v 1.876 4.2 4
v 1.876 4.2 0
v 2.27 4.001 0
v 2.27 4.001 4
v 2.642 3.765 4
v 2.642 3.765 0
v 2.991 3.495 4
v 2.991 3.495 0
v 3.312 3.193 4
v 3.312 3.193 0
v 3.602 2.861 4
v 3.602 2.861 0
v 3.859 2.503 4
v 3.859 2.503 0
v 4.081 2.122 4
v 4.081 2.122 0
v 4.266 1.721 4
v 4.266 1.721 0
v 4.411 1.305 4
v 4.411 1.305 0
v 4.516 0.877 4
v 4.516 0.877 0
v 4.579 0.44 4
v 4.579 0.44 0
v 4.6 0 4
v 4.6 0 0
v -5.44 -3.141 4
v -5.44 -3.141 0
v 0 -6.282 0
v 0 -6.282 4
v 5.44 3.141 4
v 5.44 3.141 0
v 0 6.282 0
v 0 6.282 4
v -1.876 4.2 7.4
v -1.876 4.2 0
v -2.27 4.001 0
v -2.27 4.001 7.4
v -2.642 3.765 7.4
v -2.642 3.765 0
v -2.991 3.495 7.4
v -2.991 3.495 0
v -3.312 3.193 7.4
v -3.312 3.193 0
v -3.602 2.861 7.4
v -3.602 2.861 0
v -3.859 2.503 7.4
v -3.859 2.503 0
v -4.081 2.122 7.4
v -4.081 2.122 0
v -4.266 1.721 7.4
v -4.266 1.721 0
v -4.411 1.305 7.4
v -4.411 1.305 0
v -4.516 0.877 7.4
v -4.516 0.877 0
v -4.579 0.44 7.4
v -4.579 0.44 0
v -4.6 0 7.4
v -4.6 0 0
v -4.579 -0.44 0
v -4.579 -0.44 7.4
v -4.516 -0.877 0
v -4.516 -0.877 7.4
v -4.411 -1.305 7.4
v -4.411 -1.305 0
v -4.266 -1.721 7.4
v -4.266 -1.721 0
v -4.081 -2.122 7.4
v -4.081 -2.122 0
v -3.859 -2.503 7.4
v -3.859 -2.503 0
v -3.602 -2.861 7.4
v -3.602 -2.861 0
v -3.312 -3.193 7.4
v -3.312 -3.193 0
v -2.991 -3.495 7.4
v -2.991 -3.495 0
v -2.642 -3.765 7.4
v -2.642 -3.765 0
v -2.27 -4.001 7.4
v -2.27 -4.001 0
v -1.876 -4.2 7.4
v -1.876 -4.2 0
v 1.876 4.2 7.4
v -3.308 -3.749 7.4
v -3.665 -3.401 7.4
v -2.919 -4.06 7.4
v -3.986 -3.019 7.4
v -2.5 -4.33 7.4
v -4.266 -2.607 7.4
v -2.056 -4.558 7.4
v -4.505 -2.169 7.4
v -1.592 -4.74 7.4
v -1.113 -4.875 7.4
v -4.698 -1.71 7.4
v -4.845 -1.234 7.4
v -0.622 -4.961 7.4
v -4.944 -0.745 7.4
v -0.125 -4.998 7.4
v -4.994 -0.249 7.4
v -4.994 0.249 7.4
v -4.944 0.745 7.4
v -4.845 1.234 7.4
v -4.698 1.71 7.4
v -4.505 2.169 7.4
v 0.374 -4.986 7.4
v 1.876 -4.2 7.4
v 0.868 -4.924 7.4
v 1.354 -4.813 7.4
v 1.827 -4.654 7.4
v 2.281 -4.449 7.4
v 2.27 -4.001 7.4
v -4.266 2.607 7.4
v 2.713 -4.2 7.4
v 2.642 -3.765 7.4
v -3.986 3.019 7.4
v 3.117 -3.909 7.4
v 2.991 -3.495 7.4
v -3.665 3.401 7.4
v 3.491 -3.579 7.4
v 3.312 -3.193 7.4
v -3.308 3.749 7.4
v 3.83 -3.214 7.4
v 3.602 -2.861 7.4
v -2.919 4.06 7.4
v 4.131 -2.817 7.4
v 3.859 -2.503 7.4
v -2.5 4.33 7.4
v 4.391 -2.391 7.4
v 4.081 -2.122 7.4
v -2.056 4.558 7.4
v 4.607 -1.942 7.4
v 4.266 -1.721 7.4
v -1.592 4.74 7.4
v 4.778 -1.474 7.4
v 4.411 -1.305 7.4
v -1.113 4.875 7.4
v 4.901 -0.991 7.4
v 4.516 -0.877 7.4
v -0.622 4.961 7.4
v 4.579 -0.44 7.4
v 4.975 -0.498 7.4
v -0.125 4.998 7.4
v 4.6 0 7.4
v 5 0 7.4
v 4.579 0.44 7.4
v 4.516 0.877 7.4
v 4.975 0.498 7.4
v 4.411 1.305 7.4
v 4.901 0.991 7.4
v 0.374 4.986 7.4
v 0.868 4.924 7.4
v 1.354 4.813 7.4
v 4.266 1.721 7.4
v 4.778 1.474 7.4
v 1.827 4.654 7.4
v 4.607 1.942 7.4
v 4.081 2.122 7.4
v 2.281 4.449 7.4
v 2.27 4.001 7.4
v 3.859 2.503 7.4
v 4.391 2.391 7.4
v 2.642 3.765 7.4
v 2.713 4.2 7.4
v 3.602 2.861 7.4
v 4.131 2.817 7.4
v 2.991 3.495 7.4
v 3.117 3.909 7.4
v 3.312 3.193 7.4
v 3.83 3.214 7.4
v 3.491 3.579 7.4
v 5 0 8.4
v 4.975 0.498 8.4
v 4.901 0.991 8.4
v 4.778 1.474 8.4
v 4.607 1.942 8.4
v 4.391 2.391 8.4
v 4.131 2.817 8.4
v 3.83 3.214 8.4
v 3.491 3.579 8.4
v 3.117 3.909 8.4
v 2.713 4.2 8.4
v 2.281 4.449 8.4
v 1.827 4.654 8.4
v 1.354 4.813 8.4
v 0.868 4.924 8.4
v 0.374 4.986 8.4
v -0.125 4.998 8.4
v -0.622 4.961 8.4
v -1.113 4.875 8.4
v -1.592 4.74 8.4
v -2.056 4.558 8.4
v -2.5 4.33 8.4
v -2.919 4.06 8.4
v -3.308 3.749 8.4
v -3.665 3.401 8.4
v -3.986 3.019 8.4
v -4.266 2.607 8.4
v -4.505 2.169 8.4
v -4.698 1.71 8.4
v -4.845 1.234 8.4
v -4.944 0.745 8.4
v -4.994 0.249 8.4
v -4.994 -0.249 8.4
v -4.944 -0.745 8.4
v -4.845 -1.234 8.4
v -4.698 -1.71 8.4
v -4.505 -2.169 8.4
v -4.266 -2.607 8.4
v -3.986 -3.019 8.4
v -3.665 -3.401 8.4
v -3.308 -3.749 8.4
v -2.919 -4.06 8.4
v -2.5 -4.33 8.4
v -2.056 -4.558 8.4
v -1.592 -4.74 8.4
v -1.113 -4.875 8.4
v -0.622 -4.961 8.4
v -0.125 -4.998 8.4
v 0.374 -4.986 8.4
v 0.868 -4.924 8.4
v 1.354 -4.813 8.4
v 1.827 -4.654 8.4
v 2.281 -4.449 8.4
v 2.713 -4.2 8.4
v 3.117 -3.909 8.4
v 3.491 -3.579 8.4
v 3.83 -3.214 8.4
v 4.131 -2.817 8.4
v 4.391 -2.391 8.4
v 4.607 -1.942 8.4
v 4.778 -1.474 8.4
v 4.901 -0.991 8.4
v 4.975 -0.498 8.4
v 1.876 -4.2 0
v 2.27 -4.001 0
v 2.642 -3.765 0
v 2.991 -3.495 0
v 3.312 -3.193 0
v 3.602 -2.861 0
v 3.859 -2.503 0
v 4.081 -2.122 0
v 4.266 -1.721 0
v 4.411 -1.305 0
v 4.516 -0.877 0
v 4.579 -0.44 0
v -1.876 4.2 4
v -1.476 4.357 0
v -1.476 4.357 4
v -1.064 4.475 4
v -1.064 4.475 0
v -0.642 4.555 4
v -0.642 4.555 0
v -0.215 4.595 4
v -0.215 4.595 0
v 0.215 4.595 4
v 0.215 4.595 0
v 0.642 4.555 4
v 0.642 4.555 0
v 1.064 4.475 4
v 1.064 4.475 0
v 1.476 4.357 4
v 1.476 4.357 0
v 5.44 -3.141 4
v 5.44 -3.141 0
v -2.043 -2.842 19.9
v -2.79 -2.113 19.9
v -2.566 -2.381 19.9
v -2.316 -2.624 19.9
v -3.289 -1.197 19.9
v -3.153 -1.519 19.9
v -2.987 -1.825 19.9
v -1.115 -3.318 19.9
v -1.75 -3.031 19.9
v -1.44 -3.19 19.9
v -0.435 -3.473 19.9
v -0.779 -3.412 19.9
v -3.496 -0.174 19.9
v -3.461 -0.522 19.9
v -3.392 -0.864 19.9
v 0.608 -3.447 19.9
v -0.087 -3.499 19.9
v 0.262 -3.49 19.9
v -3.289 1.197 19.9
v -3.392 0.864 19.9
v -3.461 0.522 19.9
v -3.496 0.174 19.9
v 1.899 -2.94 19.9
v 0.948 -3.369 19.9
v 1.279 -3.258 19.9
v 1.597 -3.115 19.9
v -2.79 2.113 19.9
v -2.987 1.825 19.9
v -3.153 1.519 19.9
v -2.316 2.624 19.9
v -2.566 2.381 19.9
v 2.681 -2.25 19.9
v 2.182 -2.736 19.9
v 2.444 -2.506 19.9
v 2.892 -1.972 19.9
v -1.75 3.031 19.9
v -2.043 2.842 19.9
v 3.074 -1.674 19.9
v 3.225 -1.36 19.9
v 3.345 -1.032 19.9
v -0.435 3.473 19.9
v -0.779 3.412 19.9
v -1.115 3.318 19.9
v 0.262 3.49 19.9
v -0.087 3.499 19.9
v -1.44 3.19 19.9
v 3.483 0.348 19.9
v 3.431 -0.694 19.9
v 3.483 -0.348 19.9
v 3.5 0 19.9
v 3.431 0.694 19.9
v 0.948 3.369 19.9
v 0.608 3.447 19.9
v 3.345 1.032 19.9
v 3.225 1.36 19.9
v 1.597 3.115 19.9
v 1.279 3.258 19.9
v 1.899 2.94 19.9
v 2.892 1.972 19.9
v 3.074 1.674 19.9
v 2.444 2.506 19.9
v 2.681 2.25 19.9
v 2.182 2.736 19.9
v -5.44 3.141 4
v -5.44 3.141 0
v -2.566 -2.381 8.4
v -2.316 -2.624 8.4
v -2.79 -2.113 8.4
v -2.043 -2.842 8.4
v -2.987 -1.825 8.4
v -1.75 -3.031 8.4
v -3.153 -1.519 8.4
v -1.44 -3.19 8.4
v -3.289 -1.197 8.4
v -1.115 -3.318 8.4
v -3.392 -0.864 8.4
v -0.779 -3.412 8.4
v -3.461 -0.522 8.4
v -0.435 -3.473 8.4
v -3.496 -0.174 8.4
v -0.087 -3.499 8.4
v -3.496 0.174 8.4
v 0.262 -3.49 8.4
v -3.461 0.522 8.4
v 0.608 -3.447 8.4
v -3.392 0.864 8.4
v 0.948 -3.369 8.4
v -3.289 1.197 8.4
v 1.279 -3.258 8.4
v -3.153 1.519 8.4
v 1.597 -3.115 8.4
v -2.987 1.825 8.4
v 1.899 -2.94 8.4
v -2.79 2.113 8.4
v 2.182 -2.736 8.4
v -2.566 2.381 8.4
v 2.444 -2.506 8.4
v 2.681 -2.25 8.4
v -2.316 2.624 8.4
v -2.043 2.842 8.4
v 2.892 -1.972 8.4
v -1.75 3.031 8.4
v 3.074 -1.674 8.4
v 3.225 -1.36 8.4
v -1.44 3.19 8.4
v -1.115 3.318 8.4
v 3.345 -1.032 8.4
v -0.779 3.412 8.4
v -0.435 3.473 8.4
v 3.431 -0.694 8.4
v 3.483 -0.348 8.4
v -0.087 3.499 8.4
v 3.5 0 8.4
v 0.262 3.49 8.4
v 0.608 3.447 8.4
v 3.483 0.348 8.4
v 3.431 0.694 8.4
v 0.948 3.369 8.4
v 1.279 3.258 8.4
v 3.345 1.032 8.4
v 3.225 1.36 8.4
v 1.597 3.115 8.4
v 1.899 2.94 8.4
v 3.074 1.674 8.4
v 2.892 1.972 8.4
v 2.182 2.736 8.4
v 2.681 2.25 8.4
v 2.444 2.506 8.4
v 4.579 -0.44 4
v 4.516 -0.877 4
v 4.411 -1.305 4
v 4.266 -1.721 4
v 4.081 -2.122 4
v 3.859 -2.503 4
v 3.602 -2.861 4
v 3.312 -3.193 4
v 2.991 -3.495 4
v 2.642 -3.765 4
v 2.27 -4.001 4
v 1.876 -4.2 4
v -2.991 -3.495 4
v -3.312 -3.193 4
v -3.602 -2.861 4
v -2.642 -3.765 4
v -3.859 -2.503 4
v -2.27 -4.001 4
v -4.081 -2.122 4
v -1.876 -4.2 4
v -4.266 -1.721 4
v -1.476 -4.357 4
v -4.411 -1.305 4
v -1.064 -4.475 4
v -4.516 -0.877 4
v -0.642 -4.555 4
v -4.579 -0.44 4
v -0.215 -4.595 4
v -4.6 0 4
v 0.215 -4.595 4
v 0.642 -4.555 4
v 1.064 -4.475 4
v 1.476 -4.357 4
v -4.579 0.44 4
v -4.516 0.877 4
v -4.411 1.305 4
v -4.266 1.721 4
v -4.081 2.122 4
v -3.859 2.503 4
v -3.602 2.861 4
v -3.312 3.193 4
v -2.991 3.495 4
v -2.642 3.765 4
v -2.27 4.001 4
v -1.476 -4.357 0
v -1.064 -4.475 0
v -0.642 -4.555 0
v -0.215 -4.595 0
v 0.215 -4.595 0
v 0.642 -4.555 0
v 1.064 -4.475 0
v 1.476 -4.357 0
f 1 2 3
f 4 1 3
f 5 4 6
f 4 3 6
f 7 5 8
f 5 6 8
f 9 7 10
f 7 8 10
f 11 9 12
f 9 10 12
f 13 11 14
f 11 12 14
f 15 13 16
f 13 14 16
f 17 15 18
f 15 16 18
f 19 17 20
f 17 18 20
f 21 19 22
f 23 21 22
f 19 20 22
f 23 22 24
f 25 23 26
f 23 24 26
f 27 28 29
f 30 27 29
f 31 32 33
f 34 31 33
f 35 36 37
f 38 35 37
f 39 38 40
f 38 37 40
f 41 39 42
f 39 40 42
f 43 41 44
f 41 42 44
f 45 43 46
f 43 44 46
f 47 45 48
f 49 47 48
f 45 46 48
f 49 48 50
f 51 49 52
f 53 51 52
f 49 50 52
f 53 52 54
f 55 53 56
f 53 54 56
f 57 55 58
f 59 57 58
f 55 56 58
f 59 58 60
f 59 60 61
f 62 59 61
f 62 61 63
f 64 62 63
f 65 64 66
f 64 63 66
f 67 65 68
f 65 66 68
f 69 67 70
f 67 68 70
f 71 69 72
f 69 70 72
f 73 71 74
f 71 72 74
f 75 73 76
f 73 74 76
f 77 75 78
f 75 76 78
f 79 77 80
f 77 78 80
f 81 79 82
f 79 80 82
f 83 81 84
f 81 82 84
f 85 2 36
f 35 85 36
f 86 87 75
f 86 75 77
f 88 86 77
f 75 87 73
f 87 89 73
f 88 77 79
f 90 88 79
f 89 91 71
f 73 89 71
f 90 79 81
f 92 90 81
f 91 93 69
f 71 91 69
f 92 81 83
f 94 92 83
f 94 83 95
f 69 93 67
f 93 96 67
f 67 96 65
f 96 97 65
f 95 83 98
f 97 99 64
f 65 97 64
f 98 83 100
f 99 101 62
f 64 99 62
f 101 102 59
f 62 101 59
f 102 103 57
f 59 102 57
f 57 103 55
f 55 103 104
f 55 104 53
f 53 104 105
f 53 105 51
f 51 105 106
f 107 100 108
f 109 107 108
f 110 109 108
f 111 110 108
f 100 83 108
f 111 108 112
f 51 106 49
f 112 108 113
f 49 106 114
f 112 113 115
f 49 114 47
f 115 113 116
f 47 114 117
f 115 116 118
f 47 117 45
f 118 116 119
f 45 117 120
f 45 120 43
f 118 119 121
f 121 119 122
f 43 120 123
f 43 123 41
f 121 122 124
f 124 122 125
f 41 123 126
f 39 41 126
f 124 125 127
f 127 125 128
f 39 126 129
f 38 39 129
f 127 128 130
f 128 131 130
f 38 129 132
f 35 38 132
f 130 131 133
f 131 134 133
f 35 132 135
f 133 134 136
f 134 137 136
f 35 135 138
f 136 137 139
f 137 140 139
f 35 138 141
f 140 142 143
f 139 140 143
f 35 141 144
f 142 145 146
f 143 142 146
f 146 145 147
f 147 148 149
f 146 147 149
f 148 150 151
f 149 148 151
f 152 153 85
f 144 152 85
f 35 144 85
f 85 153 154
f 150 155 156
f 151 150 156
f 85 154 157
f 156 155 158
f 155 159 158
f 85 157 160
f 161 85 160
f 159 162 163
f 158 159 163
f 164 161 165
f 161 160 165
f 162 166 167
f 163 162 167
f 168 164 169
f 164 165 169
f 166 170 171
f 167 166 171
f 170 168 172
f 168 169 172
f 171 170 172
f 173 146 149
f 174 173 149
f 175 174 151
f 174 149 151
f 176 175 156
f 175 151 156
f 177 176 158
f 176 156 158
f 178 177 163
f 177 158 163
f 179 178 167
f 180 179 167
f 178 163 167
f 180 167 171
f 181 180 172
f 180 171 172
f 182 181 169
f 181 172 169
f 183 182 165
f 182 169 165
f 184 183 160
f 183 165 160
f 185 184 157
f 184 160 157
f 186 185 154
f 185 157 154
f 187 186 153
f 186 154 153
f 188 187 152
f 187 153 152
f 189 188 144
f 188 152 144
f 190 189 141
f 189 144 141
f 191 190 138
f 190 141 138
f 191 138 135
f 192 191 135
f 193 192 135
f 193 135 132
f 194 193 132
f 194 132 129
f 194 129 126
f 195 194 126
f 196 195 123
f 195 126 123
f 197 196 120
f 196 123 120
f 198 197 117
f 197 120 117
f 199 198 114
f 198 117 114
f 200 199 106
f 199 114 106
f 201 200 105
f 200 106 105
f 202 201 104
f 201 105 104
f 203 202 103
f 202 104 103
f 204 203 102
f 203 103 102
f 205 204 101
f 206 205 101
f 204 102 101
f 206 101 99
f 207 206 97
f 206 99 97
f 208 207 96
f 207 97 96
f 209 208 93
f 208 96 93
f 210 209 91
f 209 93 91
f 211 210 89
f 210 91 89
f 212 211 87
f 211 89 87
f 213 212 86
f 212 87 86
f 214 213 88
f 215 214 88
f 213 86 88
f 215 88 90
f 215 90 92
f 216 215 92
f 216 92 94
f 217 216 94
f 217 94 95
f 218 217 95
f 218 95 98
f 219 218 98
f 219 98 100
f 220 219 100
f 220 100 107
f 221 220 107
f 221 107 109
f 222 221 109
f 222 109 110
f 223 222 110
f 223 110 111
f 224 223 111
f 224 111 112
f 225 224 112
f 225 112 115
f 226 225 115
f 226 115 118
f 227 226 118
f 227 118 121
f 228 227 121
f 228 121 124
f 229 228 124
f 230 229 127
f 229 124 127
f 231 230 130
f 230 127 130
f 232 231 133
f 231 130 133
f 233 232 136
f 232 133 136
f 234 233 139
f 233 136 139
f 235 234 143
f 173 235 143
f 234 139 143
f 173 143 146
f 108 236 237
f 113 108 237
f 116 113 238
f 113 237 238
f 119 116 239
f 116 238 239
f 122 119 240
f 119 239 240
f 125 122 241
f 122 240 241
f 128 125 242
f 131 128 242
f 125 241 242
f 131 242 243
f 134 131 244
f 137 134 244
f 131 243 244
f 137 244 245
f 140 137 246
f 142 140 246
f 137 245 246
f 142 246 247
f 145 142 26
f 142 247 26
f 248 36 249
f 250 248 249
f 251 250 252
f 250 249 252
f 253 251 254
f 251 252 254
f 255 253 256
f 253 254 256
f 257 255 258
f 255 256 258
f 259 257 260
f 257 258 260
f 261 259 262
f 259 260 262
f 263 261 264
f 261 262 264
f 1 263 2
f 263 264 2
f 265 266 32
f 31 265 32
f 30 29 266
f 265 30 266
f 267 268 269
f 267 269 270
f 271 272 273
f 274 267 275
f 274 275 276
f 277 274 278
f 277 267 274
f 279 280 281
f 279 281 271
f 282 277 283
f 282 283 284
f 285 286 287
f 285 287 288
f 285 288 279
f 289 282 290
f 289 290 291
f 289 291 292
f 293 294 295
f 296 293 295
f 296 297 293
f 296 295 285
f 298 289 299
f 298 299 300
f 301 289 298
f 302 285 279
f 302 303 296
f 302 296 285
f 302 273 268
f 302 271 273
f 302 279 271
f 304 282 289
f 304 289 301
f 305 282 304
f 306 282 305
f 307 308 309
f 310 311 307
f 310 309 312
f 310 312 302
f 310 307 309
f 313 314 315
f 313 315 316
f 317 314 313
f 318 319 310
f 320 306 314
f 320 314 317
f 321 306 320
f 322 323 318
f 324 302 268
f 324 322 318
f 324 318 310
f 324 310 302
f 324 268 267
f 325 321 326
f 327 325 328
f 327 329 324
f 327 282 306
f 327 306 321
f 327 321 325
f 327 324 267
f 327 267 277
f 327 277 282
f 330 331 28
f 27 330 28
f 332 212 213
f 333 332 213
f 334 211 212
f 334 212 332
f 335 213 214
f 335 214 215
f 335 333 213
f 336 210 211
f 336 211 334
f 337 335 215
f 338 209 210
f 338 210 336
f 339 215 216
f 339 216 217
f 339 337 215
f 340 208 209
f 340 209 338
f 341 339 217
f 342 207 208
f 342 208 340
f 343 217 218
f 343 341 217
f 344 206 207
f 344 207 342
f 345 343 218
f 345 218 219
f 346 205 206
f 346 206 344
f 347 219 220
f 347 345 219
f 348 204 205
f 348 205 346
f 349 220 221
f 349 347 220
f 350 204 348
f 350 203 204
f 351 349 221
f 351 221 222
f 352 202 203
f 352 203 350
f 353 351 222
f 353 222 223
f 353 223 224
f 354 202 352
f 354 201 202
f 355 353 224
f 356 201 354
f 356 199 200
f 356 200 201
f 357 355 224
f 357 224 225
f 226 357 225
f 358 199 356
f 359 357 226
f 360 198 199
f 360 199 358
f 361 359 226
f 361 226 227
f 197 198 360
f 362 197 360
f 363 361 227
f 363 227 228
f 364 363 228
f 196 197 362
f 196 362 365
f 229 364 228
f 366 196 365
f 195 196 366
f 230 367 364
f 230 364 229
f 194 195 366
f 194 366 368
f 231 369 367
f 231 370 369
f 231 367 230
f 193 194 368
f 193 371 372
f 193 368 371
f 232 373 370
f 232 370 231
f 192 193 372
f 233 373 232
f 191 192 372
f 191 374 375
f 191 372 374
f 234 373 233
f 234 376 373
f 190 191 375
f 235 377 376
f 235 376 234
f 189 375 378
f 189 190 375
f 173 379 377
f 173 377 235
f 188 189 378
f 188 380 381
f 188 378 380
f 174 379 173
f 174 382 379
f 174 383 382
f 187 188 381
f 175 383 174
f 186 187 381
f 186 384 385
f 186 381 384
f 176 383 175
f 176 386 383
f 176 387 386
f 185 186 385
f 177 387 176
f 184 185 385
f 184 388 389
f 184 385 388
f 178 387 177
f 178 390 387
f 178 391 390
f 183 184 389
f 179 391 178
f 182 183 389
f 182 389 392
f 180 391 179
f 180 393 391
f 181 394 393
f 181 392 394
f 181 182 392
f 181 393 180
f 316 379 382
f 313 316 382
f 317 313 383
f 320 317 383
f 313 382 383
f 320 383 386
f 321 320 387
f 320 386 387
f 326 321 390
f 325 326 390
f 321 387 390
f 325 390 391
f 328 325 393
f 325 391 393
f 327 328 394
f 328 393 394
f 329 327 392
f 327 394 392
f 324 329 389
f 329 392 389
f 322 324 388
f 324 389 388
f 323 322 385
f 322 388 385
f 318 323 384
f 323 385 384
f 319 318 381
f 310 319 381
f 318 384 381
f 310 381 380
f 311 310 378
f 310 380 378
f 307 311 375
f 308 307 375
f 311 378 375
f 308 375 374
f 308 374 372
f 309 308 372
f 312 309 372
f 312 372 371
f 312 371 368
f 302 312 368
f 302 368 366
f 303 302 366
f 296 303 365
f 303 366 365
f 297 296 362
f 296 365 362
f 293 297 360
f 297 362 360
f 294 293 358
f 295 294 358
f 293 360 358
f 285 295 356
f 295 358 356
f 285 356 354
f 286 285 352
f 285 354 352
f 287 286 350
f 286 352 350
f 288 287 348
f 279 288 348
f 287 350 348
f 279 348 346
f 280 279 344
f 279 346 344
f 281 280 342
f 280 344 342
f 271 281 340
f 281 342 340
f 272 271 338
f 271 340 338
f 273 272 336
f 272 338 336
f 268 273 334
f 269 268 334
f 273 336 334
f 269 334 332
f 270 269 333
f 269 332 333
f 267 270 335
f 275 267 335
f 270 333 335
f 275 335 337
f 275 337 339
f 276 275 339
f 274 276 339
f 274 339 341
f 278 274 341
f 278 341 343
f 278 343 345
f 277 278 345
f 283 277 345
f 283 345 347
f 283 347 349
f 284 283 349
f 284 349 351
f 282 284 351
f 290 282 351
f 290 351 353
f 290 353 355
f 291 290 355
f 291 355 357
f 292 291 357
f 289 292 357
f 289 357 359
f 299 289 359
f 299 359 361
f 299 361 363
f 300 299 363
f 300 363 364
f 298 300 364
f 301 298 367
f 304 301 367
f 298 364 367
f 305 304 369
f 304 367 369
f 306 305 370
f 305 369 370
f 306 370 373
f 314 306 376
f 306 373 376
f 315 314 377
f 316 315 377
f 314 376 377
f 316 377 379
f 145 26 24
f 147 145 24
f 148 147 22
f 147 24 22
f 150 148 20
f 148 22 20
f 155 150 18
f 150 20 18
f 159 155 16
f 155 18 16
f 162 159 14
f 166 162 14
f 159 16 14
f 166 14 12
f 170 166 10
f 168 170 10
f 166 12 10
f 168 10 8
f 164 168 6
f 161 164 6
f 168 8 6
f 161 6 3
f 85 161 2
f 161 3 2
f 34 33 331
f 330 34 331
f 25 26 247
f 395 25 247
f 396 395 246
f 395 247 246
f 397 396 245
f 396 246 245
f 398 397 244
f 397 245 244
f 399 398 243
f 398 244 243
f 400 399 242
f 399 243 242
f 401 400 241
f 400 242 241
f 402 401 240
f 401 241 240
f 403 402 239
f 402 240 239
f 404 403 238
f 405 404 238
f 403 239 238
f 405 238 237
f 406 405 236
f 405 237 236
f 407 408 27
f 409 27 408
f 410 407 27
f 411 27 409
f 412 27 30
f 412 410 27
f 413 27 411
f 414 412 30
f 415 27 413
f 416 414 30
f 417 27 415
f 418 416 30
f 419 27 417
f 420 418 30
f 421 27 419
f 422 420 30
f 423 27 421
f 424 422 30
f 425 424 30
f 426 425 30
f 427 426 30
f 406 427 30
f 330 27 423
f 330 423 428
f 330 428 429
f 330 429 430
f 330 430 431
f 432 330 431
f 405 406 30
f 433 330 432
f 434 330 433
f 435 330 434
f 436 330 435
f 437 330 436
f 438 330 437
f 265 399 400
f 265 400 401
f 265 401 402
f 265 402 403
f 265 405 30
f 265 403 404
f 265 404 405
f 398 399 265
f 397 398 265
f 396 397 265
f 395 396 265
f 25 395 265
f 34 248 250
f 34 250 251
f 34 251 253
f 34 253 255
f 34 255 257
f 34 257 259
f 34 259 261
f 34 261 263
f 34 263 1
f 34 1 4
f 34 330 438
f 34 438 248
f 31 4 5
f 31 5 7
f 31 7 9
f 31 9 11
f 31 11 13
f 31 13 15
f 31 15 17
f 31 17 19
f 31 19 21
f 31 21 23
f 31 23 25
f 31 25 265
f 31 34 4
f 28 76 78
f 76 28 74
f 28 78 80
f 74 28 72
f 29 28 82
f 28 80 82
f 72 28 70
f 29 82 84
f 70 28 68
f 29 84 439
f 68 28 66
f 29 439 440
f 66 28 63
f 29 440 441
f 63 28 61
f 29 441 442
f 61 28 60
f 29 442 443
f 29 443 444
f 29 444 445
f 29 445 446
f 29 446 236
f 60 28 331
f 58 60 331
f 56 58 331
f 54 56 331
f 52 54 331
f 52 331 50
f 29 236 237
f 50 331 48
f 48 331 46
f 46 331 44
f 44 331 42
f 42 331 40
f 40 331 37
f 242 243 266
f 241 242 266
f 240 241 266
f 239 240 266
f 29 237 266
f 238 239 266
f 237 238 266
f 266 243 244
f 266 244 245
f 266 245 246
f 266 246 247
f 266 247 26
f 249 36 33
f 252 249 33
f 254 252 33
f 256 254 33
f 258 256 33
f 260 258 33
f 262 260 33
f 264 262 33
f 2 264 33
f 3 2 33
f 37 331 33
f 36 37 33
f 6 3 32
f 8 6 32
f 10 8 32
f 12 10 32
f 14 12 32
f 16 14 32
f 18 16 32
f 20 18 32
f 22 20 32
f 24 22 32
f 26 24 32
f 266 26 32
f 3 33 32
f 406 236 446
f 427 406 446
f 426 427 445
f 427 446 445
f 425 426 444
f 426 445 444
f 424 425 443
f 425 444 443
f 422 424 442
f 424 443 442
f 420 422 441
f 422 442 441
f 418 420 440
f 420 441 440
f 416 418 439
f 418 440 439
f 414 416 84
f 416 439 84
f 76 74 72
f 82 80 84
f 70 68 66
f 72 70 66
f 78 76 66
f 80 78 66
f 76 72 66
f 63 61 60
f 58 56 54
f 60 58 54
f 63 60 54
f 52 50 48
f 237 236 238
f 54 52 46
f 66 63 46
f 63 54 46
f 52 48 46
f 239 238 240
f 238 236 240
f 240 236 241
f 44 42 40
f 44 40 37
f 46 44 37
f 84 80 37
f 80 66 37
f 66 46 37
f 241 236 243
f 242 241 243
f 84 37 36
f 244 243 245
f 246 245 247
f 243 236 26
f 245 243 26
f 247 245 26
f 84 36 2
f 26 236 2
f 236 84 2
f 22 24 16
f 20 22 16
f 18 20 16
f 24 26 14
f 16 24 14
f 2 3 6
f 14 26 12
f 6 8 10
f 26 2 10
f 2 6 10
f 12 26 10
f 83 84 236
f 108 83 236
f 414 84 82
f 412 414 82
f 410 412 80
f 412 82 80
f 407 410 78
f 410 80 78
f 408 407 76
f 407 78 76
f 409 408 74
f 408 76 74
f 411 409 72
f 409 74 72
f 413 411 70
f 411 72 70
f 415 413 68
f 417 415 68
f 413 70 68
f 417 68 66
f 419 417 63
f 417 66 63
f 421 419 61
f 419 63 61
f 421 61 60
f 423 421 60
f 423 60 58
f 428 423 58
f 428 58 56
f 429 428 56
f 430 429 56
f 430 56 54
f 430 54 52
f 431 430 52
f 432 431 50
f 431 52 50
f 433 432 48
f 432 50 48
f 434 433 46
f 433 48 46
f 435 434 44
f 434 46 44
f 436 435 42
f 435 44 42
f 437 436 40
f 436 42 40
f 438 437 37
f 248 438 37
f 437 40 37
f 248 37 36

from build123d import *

# Parameters (mm, degrees)
F1_DEPTH = 7.4
F2_R     = 5
F3_DEPTH = 1
F4_R     = 3.5
F5_DEPTH = 11.5
F7_DEPTH = 4


with BuildPart() as f1:
    # F0 (on Top) → F1 (new body)
    with BuildSketch(Plane.XY):
        with BuildLine():
            ThreePointArc((1.876166, -4.2), (3.859428, -2.502962), (4.6, 0))
            ThreePointArc((4.6, 0), (3.859428, 2.502962), (1.876166, 4.2))
            Line((1.876166, 4.2), (-1.876166, 4.2))
            ThreePointArc((-1.876166, 4.2), (-4.6, 0), (-1.876166, -4.2))
            Line((-1.876166, -4.2), (1.876166, -4.2))
        make_face()
    extrude(amount=F1_DEPTH)

    # F2 (on face) → F3 (join)
    with BuildSketch(Plane.XY.offset(7.4)):
        Circle(F2_R)
        with BuildLine():
            ThreePointArc((-1.876166, -4.2), (-4.6, 0), (-1.876166, 4.2))
            Line((-1.876166, 4.2), (1.876166, 4.2))
            ThreePointArc((1.876166, 4.2), (4.6, 0), (1.876166, -4.2))
            Line((1.876166, -4.2), (-1.876166, -4.2))
        make_face(mode=Mode.SUBTRACT)
        with BuildLine():
            Line((1.876166, 4.2), (-1.876166, 4.2))
            ThreePointArc((-1.876166, 4.2), (-4.6, 0), (-1.876166, -4.2))
            Line((-1.876166, -4.2), (1.876166, -4.2))
            ThreePointArc((1.876166, -4.2), (4.6, 0), (1.876166, 4.2))
        make_face()
    extrude(amount=F3_DEPTH)

    # F4 (on face) → F5 (join)
    with BuildSketch(Plane.XY.offset(8.4)):
        Circle(F4_R)
    extrude(amount=F5_DEPTH)


with BuildPart() as f7:
    # F6 (on face) → F7 (new body)
    with BuildSketch(Plane.XY):
        Polygon((-5.440447, 3.141043), (-5.440447, -3.141043), (0, -6.282087), (5.440447, -3.141043), (5.440447, 3.141043), (0, 6.282087), align=None)
        with BuildLine():
            ThreePointArc((1.876166, 4.2), (3.859428, 2.502962), (4.6, 0))
            ThreePointArc((4.6, 0), (3.859428, -2.502962), (1.876166, -4.2))
            ThreePointArc((1.876166, -4.2), (0, -4.6), (-1.876166, -4.2))
            ThreePointArc((-1.876166, -4.2), (-4.6, 0), (-1.876166, 4.2))
            ThreePointArc((-1.876166, 4.2), (0, 4.6), (1.876166, 4.2))
        make_face(mode=Mode.SUBTRACT)
    extrude(amount=F7_DEPTH)


solid = Compound([f1.part, f7.part])
